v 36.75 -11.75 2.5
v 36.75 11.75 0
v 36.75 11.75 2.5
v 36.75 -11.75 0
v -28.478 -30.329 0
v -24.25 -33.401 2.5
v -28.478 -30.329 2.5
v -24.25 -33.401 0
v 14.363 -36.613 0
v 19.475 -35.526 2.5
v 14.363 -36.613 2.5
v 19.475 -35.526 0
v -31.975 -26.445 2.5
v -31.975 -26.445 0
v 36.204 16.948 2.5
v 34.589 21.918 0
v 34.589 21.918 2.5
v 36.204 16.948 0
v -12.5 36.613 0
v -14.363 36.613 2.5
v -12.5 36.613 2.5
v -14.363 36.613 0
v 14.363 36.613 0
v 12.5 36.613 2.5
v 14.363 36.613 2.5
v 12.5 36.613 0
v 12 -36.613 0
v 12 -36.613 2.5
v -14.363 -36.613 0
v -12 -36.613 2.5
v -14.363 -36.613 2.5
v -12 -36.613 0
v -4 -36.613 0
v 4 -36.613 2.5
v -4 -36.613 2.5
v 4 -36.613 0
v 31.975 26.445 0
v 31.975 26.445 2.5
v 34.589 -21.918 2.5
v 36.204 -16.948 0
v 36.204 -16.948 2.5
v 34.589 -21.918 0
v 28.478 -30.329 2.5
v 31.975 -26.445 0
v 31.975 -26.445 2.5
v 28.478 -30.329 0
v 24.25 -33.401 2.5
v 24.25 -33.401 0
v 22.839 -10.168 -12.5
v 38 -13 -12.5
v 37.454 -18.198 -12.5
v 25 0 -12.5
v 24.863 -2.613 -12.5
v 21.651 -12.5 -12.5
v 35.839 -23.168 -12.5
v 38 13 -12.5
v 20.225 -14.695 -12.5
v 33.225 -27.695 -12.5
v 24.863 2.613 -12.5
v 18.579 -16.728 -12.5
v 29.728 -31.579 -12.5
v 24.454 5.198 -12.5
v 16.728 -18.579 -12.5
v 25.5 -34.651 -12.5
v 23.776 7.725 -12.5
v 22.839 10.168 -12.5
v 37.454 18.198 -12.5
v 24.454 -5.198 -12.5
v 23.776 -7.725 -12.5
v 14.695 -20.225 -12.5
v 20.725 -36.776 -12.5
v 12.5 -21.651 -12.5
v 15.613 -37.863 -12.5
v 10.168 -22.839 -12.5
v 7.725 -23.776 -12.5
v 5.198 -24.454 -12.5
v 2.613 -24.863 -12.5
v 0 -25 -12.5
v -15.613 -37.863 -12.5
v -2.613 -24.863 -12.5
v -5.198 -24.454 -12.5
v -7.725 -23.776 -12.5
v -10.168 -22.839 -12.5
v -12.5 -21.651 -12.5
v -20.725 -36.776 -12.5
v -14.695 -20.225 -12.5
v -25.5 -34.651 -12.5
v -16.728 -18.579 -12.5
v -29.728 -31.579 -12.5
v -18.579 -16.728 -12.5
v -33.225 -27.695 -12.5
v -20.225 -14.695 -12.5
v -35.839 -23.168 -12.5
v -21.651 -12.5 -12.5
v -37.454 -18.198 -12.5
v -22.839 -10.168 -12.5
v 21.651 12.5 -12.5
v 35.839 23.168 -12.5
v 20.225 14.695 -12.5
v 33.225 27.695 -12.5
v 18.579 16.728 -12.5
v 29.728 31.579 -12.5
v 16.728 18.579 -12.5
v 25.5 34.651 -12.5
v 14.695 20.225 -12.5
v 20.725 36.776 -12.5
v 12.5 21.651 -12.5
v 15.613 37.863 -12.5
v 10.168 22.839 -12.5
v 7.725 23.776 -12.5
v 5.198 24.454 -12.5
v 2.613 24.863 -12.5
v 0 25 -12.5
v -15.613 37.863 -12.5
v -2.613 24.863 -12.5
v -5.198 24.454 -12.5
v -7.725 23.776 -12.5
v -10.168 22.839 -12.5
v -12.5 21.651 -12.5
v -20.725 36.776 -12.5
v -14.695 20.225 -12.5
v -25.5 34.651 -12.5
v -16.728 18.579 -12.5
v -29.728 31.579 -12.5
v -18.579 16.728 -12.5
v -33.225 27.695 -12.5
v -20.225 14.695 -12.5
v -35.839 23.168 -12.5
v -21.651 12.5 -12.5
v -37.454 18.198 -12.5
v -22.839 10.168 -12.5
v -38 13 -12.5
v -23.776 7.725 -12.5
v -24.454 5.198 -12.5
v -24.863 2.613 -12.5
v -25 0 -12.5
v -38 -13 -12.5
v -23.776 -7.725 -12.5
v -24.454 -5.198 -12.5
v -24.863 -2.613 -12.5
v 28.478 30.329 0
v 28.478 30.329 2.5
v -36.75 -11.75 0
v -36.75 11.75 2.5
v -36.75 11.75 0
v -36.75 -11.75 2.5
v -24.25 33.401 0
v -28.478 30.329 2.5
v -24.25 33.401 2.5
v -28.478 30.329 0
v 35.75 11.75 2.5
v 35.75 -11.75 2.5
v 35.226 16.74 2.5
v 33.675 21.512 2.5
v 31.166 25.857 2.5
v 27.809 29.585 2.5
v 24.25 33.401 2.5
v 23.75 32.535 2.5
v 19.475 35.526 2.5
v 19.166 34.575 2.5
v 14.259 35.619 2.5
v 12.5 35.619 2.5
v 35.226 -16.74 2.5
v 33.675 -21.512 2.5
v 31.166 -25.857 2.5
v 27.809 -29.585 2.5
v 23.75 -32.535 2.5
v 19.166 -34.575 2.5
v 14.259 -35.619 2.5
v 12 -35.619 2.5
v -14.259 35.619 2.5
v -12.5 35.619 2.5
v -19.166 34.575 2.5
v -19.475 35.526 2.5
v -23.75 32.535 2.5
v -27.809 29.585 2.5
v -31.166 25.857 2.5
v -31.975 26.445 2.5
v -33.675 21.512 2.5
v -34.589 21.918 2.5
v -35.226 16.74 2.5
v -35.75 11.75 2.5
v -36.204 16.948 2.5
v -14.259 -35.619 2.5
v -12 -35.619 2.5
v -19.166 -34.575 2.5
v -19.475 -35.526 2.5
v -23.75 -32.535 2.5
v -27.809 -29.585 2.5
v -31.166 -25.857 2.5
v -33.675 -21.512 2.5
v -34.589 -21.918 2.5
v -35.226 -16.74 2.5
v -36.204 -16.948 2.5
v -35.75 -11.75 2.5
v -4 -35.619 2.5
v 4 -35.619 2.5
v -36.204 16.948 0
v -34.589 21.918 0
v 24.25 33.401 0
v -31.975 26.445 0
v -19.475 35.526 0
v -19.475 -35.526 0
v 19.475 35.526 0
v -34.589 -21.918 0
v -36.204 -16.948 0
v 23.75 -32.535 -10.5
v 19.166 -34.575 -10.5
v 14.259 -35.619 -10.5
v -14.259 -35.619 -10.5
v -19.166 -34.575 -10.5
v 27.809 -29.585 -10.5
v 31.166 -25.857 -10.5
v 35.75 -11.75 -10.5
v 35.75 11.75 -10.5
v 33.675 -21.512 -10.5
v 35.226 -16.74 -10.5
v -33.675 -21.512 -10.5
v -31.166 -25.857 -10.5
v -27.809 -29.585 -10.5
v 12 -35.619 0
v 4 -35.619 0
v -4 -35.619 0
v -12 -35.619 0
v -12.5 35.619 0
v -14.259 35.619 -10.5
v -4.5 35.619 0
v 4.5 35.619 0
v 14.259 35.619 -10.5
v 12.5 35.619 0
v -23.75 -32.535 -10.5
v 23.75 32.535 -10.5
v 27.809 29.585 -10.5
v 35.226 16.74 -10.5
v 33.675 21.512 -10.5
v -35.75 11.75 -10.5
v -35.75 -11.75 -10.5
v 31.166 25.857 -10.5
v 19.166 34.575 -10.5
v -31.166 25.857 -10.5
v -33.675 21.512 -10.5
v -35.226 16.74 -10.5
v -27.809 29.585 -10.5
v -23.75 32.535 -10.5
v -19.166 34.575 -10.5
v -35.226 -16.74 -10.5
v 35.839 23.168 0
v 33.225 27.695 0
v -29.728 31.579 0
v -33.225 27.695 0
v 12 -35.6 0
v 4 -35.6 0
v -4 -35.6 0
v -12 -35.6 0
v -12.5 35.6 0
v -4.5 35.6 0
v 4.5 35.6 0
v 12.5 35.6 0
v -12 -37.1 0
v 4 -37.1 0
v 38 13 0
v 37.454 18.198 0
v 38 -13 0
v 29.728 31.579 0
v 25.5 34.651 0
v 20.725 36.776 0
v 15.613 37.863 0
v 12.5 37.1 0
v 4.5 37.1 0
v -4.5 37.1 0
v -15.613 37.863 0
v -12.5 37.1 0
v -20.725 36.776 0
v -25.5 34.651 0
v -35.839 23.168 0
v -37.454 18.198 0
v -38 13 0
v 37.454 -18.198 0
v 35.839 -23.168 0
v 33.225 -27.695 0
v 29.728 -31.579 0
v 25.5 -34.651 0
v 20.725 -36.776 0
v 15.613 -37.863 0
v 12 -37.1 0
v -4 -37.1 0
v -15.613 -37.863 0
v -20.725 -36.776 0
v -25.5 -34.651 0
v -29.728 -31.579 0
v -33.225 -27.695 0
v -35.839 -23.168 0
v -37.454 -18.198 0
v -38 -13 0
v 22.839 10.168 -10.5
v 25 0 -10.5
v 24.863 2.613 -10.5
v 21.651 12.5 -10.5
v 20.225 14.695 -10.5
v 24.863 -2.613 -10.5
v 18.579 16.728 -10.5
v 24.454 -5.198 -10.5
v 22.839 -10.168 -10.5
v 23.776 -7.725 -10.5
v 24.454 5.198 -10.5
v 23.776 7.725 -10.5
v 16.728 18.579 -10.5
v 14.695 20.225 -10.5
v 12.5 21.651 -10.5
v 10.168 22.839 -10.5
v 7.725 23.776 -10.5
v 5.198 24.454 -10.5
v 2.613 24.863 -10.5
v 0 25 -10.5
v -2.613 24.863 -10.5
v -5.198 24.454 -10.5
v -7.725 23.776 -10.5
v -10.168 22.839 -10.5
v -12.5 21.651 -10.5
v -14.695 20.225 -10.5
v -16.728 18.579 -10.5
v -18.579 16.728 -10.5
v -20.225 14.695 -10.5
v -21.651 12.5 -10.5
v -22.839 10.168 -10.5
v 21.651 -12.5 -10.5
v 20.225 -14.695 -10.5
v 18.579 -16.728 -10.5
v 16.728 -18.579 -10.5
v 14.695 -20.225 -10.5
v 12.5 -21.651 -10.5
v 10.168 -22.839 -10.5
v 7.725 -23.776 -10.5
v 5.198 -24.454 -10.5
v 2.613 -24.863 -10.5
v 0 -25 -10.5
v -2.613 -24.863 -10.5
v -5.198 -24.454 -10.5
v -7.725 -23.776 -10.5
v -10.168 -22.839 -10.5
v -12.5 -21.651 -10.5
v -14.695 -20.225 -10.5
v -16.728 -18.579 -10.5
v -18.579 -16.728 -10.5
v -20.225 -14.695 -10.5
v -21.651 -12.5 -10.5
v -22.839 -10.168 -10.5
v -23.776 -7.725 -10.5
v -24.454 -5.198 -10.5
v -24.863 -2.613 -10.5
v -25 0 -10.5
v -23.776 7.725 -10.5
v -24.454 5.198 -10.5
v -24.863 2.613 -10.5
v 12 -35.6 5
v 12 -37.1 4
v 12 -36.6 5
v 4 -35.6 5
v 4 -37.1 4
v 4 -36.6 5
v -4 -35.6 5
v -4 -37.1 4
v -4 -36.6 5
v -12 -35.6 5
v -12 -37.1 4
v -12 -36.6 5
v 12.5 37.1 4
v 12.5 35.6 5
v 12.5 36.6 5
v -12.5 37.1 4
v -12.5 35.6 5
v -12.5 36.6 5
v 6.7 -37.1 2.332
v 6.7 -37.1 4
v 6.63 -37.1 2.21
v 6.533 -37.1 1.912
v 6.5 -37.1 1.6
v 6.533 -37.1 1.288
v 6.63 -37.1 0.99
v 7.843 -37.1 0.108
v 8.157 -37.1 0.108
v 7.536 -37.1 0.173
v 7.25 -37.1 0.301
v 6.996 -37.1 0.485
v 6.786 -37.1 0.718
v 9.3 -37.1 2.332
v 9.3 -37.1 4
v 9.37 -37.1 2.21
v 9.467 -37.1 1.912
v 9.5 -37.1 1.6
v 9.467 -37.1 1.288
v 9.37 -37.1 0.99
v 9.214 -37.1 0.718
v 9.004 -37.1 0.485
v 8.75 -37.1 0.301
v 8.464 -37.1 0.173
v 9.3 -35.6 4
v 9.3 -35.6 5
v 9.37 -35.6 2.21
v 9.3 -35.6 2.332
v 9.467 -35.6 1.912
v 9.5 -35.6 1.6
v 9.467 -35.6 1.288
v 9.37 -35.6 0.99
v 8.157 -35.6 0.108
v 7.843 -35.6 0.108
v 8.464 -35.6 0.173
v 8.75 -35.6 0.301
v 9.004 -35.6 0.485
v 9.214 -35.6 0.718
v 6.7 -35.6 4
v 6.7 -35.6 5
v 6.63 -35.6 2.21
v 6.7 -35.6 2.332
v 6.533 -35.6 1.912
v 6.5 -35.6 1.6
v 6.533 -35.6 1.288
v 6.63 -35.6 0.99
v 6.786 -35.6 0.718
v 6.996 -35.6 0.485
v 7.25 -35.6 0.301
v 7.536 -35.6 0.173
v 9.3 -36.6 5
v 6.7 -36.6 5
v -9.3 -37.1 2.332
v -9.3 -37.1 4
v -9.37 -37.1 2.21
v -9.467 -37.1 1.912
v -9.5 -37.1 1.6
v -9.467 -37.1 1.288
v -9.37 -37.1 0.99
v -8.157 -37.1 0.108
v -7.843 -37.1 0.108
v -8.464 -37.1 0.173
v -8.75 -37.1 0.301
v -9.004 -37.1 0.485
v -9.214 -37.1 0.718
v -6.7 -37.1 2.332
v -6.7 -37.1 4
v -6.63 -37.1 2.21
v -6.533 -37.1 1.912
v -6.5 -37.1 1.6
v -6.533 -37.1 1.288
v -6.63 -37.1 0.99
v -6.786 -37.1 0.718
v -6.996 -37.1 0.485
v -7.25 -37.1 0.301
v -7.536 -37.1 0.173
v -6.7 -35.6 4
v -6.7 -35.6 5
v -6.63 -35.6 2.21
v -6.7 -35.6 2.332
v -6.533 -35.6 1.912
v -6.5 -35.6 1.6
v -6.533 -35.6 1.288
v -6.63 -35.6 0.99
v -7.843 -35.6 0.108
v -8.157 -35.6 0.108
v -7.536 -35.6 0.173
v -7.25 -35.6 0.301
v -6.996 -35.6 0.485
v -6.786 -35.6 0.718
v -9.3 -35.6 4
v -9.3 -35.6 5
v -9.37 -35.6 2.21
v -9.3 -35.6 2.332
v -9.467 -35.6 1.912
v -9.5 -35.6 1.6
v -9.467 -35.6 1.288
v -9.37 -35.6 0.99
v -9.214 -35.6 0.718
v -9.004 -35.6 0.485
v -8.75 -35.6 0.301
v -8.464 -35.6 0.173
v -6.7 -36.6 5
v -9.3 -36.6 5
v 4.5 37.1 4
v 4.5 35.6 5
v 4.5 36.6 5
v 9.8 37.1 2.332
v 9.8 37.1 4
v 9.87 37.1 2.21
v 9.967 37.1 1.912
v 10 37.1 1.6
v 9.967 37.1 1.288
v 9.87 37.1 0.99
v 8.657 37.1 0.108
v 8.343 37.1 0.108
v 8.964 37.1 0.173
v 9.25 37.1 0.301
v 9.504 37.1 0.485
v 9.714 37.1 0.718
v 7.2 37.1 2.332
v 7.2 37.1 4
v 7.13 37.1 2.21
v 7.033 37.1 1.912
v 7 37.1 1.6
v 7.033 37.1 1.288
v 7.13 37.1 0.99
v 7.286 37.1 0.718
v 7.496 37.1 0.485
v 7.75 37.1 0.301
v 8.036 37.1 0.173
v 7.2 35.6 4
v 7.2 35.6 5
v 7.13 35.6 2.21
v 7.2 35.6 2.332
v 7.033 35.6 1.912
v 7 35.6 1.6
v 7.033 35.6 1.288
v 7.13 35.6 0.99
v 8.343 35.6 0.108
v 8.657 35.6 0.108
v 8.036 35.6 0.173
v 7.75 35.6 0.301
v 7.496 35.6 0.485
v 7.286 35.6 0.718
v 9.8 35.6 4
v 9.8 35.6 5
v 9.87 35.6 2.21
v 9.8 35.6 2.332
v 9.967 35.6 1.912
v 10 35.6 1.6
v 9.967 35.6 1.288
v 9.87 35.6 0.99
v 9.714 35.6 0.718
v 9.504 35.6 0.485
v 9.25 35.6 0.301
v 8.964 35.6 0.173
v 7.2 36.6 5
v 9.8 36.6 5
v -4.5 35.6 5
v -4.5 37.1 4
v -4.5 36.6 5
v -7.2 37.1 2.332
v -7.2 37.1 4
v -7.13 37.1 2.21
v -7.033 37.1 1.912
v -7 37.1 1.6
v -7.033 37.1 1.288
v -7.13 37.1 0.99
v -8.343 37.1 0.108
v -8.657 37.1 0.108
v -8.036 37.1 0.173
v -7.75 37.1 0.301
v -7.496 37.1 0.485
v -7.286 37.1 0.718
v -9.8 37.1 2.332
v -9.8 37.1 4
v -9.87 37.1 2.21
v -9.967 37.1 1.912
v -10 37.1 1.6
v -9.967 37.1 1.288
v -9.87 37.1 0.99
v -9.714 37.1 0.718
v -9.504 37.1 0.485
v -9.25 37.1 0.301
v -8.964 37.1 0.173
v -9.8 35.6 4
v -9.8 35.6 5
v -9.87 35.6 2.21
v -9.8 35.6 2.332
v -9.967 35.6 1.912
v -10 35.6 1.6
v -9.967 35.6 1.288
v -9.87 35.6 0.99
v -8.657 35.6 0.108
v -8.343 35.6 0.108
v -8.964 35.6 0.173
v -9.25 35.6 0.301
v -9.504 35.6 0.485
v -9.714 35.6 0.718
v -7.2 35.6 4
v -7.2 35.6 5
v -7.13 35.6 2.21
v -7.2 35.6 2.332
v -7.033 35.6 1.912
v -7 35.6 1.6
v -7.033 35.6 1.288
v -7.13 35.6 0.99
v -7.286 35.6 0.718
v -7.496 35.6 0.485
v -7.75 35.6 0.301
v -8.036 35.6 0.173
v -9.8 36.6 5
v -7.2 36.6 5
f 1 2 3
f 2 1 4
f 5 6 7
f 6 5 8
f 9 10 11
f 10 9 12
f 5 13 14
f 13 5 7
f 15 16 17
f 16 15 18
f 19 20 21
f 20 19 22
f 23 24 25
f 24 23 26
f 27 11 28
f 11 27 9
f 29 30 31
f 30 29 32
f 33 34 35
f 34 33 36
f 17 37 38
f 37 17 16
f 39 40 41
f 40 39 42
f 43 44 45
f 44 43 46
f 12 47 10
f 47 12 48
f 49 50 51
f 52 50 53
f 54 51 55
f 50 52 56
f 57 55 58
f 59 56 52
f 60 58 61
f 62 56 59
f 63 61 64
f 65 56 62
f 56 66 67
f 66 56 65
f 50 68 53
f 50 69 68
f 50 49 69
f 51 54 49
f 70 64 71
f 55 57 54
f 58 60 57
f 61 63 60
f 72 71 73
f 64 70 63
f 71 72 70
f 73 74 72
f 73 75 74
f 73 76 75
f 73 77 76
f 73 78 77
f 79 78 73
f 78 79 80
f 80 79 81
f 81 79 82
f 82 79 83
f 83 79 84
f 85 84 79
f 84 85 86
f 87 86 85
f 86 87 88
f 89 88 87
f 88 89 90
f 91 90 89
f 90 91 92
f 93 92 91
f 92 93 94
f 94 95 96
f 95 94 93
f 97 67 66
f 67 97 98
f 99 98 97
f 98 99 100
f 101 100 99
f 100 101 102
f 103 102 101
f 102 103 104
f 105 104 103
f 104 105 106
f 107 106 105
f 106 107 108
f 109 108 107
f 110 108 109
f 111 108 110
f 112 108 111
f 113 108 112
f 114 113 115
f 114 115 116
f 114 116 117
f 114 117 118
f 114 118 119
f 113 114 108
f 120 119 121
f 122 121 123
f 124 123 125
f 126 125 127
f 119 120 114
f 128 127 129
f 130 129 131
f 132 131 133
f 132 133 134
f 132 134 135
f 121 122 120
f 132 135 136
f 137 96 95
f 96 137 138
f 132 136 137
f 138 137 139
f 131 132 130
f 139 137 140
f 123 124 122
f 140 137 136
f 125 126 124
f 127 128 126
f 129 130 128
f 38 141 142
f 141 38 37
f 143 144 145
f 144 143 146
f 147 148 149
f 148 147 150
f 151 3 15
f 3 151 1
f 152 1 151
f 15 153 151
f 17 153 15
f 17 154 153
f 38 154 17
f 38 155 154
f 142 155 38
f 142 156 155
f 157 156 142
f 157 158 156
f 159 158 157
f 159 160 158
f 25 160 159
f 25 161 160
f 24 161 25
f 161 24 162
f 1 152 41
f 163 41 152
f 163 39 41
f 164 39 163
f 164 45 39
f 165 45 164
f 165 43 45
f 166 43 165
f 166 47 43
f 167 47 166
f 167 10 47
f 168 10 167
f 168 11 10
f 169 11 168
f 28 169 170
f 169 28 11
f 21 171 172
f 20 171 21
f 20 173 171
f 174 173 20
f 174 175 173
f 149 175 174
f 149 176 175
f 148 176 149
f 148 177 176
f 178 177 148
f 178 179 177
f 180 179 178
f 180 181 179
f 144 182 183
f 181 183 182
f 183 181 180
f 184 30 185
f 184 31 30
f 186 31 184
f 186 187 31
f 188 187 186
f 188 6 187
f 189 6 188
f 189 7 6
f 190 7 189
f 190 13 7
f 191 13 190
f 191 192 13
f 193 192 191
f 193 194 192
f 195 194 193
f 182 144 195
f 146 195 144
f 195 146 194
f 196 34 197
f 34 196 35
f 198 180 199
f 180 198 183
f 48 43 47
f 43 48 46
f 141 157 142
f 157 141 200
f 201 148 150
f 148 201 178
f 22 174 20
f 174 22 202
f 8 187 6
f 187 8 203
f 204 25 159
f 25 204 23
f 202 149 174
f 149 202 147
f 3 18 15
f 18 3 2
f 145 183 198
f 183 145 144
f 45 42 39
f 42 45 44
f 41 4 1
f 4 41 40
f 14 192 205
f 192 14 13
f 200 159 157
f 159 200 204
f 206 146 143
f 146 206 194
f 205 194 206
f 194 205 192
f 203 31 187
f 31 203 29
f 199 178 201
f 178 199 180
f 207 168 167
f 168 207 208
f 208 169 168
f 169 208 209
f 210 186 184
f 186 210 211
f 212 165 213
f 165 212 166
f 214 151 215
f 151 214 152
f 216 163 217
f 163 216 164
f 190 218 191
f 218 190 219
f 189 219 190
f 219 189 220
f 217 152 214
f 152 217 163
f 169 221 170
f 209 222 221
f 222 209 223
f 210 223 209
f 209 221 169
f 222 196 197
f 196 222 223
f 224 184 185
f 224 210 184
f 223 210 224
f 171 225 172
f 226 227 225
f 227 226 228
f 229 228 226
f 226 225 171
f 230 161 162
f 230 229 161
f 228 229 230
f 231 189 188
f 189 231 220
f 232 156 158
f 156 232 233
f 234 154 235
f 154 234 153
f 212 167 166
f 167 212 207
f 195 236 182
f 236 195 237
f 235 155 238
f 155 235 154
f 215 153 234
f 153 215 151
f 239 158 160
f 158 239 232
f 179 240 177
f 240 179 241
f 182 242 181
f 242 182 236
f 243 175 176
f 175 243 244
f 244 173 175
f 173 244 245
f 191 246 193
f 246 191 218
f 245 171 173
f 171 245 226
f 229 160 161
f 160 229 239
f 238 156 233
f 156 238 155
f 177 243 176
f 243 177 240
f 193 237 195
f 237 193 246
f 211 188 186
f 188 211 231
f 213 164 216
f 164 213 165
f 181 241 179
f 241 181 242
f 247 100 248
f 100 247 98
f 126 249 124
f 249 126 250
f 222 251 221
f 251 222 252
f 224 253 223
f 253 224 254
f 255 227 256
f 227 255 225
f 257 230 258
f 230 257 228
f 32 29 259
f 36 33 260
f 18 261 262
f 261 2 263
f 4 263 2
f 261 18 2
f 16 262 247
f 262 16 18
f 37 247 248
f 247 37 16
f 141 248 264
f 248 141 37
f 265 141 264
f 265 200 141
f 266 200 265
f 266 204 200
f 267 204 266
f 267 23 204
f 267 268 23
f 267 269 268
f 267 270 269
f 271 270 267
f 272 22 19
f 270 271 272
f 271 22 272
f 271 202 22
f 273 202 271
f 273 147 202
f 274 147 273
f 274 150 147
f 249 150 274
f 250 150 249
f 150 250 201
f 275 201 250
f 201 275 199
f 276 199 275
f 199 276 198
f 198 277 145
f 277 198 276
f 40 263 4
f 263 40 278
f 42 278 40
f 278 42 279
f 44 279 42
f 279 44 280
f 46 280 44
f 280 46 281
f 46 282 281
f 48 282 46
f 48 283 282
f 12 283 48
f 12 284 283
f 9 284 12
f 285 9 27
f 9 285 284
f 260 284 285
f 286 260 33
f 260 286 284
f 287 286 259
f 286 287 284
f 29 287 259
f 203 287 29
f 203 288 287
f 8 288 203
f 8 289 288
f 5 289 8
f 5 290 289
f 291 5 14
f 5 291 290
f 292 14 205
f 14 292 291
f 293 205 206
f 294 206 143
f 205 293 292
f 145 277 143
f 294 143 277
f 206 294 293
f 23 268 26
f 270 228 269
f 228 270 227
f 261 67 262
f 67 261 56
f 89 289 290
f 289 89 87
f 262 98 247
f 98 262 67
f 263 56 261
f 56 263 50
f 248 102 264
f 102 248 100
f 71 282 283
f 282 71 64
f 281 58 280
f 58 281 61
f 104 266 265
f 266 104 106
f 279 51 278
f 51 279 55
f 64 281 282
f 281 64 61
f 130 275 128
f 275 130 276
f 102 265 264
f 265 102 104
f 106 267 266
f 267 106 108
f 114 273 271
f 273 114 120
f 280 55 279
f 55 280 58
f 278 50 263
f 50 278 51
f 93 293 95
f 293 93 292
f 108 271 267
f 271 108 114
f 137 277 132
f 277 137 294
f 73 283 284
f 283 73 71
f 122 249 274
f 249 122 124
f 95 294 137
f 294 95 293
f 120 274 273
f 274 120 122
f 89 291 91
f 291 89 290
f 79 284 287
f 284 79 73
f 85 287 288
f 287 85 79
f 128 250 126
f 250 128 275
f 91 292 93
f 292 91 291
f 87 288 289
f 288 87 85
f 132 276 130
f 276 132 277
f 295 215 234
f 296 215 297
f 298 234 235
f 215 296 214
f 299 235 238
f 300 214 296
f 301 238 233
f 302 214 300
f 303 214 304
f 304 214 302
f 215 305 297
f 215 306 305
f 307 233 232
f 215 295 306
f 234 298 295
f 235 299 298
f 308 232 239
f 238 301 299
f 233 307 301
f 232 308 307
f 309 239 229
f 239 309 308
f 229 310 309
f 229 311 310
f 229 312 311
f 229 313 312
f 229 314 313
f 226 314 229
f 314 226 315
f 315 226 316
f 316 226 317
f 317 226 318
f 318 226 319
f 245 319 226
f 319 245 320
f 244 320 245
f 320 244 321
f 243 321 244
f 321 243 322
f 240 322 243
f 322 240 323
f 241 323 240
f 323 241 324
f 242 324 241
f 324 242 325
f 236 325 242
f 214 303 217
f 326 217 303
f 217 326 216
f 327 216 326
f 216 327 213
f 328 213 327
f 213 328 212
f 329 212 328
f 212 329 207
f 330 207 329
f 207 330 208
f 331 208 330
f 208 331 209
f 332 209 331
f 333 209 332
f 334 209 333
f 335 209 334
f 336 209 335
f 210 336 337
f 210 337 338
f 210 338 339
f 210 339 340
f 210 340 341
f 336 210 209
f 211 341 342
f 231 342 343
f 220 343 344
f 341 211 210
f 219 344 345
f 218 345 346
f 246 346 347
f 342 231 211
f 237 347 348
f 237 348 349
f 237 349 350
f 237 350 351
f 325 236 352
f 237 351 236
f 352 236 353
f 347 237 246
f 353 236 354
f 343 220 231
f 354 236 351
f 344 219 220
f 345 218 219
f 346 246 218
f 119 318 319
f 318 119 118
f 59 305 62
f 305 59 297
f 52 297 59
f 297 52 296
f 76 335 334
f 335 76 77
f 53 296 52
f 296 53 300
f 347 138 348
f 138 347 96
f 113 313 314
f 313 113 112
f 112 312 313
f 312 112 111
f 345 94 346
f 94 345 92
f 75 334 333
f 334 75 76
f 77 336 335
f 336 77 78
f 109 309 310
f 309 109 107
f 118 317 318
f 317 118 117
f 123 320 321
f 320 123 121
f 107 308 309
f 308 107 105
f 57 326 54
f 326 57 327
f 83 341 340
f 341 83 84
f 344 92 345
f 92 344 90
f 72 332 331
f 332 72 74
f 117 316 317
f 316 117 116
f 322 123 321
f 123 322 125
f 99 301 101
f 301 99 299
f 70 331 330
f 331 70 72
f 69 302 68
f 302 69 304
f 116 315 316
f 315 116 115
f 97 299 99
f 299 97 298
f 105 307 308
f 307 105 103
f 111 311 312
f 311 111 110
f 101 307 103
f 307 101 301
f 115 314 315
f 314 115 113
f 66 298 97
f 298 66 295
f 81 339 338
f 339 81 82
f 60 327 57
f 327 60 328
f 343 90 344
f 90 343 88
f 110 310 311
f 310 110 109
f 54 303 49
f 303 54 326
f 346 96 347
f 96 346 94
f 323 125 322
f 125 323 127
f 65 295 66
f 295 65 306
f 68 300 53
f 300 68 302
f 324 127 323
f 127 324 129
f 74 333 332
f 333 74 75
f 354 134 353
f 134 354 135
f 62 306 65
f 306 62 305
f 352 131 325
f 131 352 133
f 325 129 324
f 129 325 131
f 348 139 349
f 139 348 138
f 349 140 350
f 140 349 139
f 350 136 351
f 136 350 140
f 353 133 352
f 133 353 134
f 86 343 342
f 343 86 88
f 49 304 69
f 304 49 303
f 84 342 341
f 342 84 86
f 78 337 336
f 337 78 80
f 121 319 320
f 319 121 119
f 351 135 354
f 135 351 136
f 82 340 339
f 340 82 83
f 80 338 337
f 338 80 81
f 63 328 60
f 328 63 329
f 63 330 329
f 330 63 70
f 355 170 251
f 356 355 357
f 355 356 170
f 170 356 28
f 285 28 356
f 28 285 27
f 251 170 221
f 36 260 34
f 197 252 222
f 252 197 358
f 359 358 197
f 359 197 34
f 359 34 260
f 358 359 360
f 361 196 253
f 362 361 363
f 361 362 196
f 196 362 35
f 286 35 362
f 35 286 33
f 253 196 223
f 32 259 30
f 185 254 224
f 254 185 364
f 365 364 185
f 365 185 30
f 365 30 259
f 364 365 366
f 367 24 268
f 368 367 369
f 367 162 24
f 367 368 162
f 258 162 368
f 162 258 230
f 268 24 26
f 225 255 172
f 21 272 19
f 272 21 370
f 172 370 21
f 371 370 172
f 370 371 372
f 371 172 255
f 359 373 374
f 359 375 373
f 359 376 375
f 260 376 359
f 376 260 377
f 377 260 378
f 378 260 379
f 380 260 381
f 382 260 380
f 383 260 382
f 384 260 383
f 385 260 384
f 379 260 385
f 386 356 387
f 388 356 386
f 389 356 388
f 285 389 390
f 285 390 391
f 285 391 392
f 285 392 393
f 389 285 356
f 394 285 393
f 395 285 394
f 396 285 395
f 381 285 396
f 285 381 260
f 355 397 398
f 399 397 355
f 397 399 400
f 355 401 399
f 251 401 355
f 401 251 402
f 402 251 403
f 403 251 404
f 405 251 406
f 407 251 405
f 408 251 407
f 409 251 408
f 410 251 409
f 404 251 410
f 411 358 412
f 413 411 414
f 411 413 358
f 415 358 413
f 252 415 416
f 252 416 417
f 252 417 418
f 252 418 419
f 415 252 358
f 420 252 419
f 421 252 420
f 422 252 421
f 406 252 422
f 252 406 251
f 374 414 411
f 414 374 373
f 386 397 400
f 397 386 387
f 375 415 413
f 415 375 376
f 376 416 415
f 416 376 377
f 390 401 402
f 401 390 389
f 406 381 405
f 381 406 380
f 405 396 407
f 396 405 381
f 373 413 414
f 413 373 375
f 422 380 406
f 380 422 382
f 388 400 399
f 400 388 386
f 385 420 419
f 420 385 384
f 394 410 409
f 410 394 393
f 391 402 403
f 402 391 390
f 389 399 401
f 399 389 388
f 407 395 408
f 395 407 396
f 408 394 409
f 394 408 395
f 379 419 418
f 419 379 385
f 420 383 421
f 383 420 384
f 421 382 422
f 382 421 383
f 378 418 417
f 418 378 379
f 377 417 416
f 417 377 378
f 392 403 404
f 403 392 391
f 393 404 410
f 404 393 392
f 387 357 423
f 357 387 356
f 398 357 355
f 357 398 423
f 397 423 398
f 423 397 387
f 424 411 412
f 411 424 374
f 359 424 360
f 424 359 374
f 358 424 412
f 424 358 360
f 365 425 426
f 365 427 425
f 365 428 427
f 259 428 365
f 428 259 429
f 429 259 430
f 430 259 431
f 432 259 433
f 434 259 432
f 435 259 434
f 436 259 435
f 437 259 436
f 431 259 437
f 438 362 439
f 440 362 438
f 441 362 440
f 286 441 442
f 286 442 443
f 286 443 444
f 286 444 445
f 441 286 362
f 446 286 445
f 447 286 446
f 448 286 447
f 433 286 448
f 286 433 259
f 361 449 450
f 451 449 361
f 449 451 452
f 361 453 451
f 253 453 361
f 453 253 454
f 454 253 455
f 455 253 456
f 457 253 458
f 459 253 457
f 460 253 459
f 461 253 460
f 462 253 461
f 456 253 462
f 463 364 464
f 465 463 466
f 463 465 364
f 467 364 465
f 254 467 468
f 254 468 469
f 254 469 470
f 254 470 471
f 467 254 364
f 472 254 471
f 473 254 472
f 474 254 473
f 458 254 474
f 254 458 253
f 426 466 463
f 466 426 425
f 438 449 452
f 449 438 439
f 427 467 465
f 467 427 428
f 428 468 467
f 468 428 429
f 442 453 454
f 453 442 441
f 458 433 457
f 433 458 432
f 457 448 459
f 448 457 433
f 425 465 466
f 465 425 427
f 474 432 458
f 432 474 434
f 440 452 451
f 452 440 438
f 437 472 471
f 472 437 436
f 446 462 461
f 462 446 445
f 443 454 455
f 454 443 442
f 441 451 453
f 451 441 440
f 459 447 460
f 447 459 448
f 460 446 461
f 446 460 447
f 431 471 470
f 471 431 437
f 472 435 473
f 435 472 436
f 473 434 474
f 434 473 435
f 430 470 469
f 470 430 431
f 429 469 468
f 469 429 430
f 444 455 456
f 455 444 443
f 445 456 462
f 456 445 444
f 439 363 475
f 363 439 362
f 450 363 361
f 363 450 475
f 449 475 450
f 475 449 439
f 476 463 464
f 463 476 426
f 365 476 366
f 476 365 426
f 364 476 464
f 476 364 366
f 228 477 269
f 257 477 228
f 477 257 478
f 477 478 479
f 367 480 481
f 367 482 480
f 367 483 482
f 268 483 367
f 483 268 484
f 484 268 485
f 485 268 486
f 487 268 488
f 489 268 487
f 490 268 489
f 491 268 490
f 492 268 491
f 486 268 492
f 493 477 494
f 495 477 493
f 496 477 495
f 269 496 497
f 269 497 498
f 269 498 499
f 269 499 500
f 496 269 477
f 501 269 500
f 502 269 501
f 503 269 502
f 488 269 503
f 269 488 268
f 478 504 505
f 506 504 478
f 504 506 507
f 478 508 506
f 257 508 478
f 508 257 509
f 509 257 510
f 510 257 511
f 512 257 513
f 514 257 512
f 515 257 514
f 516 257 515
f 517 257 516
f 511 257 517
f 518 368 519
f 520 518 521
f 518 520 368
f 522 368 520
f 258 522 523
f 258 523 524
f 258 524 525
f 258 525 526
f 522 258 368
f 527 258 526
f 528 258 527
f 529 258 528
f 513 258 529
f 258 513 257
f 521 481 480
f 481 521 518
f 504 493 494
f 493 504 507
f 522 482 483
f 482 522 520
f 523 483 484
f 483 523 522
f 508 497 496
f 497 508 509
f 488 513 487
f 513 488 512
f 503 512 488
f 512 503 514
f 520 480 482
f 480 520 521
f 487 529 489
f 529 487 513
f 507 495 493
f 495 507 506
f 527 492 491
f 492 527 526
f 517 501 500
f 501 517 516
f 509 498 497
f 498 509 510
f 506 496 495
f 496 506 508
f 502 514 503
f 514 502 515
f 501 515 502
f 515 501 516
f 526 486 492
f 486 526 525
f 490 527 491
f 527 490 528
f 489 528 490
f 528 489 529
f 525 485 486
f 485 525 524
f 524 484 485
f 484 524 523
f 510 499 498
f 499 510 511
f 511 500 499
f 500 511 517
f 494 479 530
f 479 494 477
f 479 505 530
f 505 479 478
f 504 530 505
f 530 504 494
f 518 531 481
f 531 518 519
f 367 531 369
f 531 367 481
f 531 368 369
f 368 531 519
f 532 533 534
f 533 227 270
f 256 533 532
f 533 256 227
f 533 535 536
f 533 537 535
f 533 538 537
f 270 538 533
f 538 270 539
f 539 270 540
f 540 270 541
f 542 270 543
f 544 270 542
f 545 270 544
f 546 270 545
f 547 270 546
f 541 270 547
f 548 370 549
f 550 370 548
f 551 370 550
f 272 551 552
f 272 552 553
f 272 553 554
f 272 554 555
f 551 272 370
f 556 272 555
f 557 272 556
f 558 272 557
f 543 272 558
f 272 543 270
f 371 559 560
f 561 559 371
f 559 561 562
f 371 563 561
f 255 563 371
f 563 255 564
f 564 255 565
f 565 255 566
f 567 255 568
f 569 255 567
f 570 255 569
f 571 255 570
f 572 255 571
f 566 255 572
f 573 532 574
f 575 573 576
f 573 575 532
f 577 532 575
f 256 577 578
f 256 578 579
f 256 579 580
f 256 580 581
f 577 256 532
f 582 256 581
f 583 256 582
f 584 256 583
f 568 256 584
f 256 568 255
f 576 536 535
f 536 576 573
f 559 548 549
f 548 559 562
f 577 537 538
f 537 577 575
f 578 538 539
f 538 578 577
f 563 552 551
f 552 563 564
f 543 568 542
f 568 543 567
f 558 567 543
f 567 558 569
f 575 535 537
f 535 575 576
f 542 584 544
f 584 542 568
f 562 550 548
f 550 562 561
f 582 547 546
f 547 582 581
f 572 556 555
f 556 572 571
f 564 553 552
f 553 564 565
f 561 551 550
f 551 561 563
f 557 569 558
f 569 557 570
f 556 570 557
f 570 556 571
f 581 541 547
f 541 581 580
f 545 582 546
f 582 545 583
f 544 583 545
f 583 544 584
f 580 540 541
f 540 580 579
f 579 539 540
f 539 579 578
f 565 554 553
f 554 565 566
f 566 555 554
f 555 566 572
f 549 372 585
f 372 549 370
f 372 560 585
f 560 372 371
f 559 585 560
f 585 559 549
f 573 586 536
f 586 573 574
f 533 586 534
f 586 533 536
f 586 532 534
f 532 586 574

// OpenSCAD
// Rounded Box Module for OpenSCAD
// Parameters:
// - size: [width, depth, height] of the box
// - radius: radius of the rounded corners (only for horizontal edges)
// - center: true/false to center the box
// - wall_thickness: thickness of the walls (default 1mm)

// Centered Cube Module
// Creates a cube that is centered in x and y axes but not in z
// Parameters:
// - size: [width, depth, height] of the cube

inner_size = 73.5;
outter_size = 76;
height = 15;

module c_cube(size=[10, 10, 10]) {
    translate([-size[0]/2, -size[1]/2, 0])
        cube(size);
}

module honeycomb() {
    for (i = [-4:4]) {
        for (j = [-4:4]) {
            // Offset every other row for honeycomb effect
            translate([i*7 + (j%2)*3.5, j*6, 0])
                cylinder(h=2, r=3, $fn=6, center=true); // Hexagonal holes
        }
    }
    
    // Add decorative circular pattern around the edges
    for (angle = [0:45:359]) {
        translate([25*cos(angle), 25*sin(angle), 10-0.5])
            cylinder(h=1, r=2, $fn=12, center=true);
    }
}

module rounded_box(size=[20, 15, 10], radius=10, center=true, wall_thickness=1) {
    // Error checking
    r = min(radius, min(size[0]/2, size[1]/2));
    
    // Adjust dimensions
    width = size[0];
    depth = size[1];
    height = size[2];
    
    // Calculate offsets for centering in x and y
    x_offset = center ? -width/2 : 0;
    y_offset = center ? -depth/2 : 0;
    
    translate([x_offset, y_offset, 0]) {
        difference() {
            // Outer shell
            hull() {
                // Place 4 cylinders at the vertical edges
                for (x = [r, width-r]) {
                    for (y = [r, depth-r]) {
                        translate([x, y, 0])
                            cylinder(h=height, r=r, $fn=30);
                    }
                }
            }
            
            // Inner cutout
            translate([0, 0, wall_thickness]) // Leave bottom with thickness
            hull() {
                // Place 4 cylinders at the vertical edges with reduced radius
                for (x = [r, width-r]) {
                    for (y = [r, depth-r]) {
                        translate([x, y, 0])
                            cylinder(h=height, r=r-wall_thickness, $fn=30);
                    }
                }
            }
        }
    }
}

module lever(wall_thickness=1.5, center=true) {
    // Create a simple lever - a rectangular box with dimensions 8mm x 1mm x 5mm
    // (length x width x height)
    hole_width=2.6;
    extrude_height=1;
    
    // Apply centering transformation if needed - only for x and y, not for z
    translate(center ? [-4, -wall_thickness/2, 0] : [0, 0, 0]) {
        difference() {
            cube([8, wall_thickness, 5-extrude_height]);
            translate([(8-hole_width)/2, 0, 1])
              cube([hole_width, wall_thickness, 4]);
            translate([4, wall_thickness, 1.6])
                rotate([90, 0, 0])
                    cylinder(h=wall_thickness, r=1.5, $fn=30);
            // Chamfer the top edge of the lever by 0.05mm
        }
        translate([(8-hole_width)/2, 0, 5-extrude_height])
            rotate([0, -90, 0])
            linear_extrude(height=(8-hole_width)/2)
            polygon(points=[[0,0], [extrude_height,0], [extrude_height,1], [0,wall_thickness]]);
        translate([8, 0, 5-extrude_height])
            rotate([0, -90, 0])
            linear_extrude(height=(8-hole_width)/2)
            polygon(points=[[0,0], [extrude_height,0], [extrude_height,1], [0,wall_thickness]]);
    }
}

// Example usage:
difference() {
    translate([0, 0, -height+2.5]) {
        difference() {
            union() {
                rounded_box([inner_size, inner_size, height], 25);
                rounded_box([outter_size, outter_size, height-2.5], 25, wall_thickness=2);
            }
    
            // honeycomb();
            // Hole for LED diffuser
            translate([0, 0, 0])
                cylinder(h=20, d=50, center=true, $fn=60);
        }
    }
    translate([8, -inner_size/2+0.4, 0])
        c_cube([8, 1.5, 5]);
    translate([-8, -inner_size/2+0.4, 0])
        c_cube([8, 1.5, 5]);
    translate([0, inner_size/2-0.4, 0])
        c_cube([25, 1.5, 5]);
}
translate([8, -inner_size/2+0.4, 0])
    rotate([0, 0, 180])
        lever();
translate([-8, -inner_size/2+0.4, 0])
    rotate([0, 0, 180])
        lever();
translate([8.5, inner_size/2-0.4, 0])
    lever();
translate([-8.5, inner_size/2-0.4, 0])
    lever();

// translate([0, inner_size/2-0.4+0.3, 10-2.5+2.5-0.7])
//    rotate([-10, 0, 0])
//        cylinder(h=6, d=1, center=true, $fn=30);
